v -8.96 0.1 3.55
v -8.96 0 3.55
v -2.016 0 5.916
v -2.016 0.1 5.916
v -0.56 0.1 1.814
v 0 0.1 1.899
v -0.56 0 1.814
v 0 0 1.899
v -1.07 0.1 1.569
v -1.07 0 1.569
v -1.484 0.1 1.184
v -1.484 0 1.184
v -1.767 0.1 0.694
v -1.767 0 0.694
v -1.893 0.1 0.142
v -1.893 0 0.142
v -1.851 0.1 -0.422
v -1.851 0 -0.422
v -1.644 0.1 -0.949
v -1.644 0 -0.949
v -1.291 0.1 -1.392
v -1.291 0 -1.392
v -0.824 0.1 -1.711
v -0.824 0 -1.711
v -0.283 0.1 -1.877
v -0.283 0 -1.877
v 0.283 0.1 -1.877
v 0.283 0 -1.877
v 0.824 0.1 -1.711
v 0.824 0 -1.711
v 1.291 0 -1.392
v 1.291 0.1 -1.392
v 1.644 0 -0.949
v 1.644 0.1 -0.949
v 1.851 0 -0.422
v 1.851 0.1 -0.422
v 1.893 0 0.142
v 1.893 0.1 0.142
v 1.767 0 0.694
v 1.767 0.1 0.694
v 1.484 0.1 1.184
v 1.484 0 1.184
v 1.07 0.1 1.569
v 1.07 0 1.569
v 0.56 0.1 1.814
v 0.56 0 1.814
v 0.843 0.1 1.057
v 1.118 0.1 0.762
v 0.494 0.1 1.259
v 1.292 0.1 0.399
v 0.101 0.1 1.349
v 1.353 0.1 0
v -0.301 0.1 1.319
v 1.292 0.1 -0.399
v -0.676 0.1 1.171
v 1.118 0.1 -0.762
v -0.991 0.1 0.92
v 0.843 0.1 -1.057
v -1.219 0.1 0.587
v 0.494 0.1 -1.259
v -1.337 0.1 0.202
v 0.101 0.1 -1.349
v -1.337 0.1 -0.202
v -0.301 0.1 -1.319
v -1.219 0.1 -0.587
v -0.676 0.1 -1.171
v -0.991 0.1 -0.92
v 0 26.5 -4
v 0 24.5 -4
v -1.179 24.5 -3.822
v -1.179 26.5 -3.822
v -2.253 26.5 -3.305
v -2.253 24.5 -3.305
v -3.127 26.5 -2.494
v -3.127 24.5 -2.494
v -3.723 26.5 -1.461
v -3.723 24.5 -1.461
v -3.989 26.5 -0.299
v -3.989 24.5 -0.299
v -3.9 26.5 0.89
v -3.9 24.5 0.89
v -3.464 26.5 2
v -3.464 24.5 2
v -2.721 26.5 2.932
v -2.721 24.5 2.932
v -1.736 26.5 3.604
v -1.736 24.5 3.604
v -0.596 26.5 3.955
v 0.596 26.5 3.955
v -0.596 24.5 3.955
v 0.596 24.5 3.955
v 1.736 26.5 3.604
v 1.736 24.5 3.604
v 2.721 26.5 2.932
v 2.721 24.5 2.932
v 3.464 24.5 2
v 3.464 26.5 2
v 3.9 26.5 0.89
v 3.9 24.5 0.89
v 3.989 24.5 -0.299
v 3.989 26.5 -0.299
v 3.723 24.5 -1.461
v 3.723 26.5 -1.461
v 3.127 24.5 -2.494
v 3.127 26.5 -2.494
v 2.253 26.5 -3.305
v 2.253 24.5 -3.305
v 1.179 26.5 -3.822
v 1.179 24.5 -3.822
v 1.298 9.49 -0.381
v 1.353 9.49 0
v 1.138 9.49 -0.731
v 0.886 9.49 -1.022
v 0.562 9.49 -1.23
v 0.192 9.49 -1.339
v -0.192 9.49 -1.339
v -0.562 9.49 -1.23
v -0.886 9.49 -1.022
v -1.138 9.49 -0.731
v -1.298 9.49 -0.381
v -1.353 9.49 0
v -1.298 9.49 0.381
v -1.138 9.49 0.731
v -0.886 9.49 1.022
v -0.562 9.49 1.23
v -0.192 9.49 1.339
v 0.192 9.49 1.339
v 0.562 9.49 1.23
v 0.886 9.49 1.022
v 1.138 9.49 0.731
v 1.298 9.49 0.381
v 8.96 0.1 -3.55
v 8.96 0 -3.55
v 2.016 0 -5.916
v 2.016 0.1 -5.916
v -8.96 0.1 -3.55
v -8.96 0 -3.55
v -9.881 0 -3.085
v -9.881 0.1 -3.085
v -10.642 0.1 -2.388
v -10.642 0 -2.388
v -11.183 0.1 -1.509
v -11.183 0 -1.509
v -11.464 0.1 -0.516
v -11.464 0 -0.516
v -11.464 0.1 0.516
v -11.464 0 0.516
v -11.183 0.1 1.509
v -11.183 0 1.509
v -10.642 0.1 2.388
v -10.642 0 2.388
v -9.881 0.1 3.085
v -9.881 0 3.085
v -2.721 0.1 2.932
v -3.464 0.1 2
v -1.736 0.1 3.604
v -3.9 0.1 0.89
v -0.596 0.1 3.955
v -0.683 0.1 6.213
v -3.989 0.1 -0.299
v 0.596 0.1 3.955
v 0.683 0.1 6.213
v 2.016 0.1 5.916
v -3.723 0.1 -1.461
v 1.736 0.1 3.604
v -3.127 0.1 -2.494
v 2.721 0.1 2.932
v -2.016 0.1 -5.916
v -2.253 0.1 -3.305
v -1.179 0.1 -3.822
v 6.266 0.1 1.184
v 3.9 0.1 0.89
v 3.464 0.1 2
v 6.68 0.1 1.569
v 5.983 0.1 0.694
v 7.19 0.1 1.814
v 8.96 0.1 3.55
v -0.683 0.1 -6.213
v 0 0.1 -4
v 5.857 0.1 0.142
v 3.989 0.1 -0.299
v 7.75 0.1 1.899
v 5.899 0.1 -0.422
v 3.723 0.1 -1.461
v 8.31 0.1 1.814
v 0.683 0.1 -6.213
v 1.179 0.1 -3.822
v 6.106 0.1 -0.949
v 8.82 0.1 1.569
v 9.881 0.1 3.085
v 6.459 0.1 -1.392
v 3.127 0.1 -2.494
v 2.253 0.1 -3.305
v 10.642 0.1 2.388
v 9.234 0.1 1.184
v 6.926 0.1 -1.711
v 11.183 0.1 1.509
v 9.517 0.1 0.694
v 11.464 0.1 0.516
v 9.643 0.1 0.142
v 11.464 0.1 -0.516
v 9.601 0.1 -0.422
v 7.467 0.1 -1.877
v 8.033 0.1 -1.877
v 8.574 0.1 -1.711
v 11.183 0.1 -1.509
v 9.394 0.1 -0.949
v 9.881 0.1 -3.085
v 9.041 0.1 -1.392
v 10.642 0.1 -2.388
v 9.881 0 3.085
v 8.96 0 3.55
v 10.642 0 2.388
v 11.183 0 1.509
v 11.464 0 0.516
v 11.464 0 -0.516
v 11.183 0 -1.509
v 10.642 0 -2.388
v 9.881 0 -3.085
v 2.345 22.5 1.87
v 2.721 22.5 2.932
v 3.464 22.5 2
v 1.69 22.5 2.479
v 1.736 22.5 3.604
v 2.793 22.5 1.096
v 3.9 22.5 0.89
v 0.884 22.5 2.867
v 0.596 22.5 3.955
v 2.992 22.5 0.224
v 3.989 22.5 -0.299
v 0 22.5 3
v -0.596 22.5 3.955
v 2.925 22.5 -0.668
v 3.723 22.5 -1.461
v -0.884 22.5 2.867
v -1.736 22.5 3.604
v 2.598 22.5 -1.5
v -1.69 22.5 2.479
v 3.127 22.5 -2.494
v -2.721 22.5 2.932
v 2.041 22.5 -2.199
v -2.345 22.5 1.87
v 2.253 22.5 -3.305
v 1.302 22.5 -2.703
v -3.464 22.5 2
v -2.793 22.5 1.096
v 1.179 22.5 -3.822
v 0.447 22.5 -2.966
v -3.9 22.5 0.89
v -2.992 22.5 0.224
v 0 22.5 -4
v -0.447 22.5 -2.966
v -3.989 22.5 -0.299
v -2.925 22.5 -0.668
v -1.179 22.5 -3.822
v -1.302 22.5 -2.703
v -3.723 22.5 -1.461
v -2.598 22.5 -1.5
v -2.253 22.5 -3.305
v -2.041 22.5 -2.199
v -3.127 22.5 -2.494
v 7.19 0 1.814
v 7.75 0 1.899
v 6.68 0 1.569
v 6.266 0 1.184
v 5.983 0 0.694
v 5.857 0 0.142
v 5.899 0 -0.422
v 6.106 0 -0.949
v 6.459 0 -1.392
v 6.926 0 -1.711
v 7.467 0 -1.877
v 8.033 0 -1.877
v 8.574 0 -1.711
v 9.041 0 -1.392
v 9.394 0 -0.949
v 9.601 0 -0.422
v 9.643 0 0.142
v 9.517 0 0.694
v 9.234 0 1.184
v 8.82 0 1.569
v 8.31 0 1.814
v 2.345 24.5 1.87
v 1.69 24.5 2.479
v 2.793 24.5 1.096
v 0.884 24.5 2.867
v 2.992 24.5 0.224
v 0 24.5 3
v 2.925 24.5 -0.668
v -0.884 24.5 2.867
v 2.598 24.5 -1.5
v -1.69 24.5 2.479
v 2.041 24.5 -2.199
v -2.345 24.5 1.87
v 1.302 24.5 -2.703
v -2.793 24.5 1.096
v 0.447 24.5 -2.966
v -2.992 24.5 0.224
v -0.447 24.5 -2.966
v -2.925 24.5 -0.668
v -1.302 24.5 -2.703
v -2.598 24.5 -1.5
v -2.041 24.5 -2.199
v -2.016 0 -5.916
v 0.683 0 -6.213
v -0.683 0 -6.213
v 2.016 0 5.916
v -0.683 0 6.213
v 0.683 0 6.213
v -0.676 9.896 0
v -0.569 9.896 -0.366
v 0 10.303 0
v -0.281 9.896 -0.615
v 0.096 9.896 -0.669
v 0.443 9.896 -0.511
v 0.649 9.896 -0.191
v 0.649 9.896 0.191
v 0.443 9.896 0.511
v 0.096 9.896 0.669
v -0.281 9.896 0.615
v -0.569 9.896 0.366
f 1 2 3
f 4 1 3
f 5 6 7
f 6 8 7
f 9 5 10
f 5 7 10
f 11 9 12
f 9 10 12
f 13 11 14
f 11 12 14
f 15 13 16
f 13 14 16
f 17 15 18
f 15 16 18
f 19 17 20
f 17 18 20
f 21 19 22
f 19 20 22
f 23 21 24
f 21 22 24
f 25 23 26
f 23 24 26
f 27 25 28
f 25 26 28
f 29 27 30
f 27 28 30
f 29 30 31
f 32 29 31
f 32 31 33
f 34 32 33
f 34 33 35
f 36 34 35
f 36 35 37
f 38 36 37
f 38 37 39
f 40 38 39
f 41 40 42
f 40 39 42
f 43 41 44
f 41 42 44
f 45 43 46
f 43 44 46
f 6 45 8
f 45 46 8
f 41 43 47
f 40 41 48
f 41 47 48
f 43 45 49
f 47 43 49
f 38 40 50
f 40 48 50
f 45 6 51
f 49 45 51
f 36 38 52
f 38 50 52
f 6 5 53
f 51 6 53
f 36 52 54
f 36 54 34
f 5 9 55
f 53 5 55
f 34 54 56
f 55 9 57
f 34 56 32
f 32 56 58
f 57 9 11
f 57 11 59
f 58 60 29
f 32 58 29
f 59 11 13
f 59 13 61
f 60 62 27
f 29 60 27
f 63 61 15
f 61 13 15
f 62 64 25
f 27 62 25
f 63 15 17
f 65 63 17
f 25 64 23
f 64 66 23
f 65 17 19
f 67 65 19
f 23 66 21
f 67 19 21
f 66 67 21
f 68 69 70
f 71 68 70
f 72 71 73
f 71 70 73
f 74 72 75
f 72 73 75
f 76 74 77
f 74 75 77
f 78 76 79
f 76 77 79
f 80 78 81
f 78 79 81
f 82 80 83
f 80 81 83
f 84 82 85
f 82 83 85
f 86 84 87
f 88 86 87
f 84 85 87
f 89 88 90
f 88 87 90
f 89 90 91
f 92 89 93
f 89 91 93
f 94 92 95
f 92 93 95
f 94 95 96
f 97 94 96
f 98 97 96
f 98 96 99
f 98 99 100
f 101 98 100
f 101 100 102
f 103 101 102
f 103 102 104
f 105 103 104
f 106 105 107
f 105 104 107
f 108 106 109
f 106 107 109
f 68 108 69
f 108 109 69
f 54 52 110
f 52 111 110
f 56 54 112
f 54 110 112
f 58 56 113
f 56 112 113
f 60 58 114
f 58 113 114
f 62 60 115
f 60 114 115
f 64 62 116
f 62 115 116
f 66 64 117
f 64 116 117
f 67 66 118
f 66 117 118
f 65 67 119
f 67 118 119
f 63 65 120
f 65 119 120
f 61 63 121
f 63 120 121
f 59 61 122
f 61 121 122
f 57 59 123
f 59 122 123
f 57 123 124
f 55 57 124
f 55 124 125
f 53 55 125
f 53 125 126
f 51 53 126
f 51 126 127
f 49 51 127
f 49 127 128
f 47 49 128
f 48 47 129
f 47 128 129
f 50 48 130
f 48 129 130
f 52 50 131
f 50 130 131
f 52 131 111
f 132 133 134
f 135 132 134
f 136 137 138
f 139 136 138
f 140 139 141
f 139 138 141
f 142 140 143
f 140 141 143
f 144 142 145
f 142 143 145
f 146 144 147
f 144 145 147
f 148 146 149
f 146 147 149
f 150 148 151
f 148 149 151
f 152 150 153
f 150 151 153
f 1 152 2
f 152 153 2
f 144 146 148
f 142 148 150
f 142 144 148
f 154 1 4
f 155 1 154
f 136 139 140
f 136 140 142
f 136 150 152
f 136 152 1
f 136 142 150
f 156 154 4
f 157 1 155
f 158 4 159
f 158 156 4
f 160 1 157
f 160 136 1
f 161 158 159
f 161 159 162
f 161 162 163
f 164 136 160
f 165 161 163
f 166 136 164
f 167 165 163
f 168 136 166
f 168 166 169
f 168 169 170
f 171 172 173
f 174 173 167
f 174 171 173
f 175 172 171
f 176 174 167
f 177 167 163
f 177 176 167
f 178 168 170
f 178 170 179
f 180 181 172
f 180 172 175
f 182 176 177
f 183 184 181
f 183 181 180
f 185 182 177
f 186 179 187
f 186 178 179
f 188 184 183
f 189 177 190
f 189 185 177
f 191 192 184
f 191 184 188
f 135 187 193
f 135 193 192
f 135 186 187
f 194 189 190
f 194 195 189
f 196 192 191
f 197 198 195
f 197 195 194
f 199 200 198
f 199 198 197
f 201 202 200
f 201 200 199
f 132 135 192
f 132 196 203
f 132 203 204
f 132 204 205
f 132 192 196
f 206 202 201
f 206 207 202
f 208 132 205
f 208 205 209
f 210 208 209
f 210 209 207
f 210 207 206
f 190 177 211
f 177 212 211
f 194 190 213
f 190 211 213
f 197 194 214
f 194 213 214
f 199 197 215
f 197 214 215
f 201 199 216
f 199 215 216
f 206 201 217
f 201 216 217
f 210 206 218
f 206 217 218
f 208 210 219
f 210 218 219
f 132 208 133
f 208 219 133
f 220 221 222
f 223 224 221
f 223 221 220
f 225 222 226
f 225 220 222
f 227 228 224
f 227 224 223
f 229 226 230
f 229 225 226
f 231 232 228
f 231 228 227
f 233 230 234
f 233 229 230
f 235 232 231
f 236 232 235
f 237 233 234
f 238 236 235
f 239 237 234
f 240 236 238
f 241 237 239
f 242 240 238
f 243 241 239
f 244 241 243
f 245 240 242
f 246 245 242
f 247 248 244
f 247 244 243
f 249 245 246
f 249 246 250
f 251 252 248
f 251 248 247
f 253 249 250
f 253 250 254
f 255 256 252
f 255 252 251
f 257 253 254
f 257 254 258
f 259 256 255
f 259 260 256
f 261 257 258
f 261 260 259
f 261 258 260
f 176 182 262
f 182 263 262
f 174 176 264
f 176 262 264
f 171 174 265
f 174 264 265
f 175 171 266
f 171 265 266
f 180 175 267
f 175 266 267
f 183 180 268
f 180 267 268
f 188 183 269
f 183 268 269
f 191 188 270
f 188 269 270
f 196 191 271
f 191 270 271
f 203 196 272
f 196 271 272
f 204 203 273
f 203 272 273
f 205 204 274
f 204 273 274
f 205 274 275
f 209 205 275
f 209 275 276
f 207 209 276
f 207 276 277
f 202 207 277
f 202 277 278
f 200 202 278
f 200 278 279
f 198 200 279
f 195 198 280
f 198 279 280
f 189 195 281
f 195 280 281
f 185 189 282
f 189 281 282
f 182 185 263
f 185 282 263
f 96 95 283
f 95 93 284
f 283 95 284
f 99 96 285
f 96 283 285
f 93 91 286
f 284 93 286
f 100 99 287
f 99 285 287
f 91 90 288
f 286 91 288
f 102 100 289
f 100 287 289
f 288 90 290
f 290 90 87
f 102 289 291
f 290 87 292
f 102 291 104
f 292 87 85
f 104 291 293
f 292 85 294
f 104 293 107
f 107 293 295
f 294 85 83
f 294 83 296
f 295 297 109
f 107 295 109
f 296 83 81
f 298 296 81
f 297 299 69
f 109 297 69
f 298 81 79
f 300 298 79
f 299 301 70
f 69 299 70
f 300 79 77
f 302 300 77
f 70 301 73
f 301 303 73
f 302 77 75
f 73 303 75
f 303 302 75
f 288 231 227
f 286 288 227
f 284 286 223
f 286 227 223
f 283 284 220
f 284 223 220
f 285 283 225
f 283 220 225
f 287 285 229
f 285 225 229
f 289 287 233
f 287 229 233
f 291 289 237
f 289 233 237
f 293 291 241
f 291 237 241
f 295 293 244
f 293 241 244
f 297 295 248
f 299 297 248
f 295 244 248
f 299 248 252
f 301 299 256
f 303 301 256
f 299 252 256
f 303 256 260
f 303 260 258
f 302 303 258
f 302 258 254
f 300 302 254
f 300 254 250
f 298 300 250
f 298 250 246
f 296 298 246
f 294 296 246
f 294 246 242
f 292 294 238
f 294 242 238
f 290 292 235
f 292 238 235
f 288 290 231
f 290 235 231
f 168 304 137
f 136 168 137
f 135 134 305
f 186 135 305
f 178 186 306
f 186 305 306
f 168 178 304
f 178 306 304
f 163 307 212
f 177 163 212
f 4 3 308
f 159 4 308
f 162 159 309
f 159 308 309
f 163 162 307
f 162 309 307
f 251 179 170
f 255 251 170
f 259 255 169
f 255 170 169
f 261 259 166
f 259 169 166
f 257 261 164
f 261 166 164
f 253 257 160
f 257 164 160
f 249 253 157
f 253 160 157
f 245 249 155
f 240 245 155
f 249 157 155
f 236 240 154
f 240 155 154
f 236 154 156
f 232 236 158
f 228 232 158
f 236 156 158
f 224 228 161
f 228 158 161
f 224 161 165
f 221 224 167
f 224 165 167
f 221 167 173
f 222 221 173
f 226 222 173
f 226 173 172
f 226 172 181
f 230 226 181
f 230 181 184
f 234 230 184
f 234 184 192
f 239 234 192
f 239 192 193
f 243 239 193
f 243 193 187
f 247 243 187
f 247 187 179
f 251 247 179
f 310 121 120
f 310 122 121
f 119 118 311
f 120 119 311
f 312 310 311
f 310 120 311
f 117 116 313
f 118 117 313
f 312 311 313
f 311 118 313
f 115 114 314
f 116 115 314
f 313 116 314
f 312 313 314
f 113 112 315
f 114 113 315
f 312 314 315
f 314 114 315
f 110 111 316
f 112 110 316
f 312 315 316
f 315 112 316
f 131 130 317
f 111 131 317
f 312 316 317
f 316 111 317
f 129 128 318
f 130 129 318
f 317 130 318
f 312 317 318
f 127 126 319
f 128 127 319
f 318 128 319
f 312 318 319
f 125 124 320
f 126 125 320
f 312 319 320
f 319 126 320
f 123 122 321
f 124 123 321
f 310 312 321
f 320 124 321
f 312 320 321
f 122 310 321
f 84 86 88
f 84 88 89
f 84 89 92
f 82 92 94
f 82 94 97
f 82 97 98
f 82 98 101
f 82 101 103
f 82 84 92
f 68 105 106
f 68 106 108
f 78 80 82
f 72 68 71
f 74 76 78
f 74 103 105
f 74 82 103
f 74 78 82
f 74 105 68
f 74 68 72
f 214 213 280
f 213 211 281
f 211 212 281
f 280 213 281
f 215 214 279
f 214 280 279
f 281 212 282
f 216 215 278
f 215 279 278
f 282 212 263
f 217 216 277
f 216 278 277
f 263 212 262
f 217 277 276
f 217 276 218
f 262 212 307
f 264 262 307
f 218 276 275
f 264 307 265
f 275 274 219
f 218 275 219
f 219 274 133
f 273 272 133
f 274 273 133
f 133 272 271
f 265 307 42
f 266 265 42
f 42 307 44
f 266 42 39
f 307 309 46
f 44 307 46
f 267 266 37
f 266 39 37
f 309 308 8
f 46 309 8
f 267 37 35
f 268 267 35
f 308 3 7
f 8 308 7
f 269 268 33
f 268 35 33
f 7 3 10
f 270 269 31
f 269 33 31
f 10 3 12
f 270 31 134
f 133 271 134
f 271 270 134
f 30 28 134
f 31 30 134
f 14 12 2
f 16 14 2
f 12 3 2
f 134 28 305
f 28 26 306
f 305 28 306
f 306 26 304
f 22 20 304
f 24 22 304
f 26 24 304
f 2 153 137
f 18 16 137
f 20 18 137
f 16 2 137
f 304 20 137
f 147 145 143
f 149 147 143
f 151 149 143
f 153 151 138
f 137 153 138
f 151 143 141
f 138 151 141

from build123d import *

# Parameters (mm, degrees)
SKETCH1_R                      = 6.25
SKETCH1_R_2                    = 3.75
SKETCH1_R_3                    = 2.5
BOSS_EXTRUDE1_DEPTH            = 0.1
SKETCH2_R                      = 4
BOSS_EXTRUDE2_DEPTH            = 22.5
SKETCH3_R                      = 3
BOSS_EXTRUDE3_DEPTH            = 2
SKETCH4_R                      = 4
BOSS_EXTRUDE4_DEPTH            = 2
SKETCH6_W                      = 1.89865
SKETCH6_H                      = 0.1
F_6_CLEARANCE_HOLE1_AT_2_COUNT = 2
F_6_CLEARANCE_HOLE1_AT_2_PITCH = 7.75
F_6_32_TAPPED_HOLE2_D          = 2.7051
F_6_32_TAPPED_HOLE2_DEPTH      = 9.39
F_6_32_TAPPED_HOLE2_TIP        = 0.81269403


with BuildPart() as part:
    # Sketch1 → Boss-Extrude1 (new body)
    # profile 1 of 15: a face of its own
    with BuildSketch(Plane(origin=(0, 0, 0), x_dir=(1, 0, 0), z_dir=(0, 1, 0))):
        Circle(SKETCH1_R)
    # profile 2 of 15: a face of its own
    with BuildSketch(Plane(origin=(0, 0, 0), x_dir=(1, 0, 0), z_dir=(0, 1, 0))):
        with Locations((-7.75, 0)):
            Circle(SKETCH1_R_2)
        with Locations((-7.75, 0)):
            Circle(SKETCH1_R_3, mode=Mode.SUBTRACT)
    # profile 3 of 15: a face of its own
    with BuildSketch(Plane(origin=(0, 0, 0), x_dir=(1, 0, 0), z_dir=(0, 1, 0))):
        Circle(SKETCH1_R)
    # profile 4 of 15: a face of its own
    with BuildSketch(Plane(origin=(0, 0, 0), x_dir=(1, 0, 0), z_dir=(0, 1, 0))):
        with Locations((-7.75, 0)):
            Circle(SKETCH1_R_2)
        with Locations((-7.75, 0)):
            Circle(SKETCH1_R_3, mode=Mode.SUBTRACT)
    # profile 5 of 15: a face of its own
    with BuildSketch(Plane(origin=(0, 0, 0), x_dir=(1, 0, 0), z_dir=(0, 1, 0))):
        with Locations((7.75, 0)):
            Circle(SKETCH1_R_2)
    # profile 6 of 15: a face of its own
    with BuildSketch(Plane(origin=(0, 0, 0), x_dir=(1, 0, 0), z_dir=(0, 1, 0))):
        Circle(SKETCH1_R)
    # profile 7 of 15: a face of its own
    with BuildSketch(Plane(origin=(0, 0, 0), x_dir=(1, 0, 0), z_dir=(0, 1, 0))):
        with Locations((-7.75, 0)):
            Circle(SKETCH1_R_2)
    # profile 8 of 15: a face of its own
    with BuildSketch(Plane(origin=(0, 0, 0), x_dir=(1, 0, 0), z_dir=(0, 1, 0))):
        with BuildLine():
            ThreePointArc((-5.487903226, -2.990889196), (-7.15425073, -3.702375293), (-8.959677419, -3.54953244))
            Line((-8.959677419, -3.54953244), (-2.016129032, -5.9158874))
            ThreePointArc((-2.016129032, -5.9158874), (-4.026975125, -4.77974595), (-5.487903226, -2.990889196))
        make_face()
    # profile 9 of 15: a face of its own
    with BuildSketch(Plane(origin=(0, 0, 0), x_dir=(1, 0, 0), z_dir=(0, 1, 0))):
        with BuildLine():
            ThreePointArc((5.487903226, -2.990889196), (4.026975125, -4.77974595), (2.016129032, -5.9158874))
            Line((2.016129032, -5.9158874), (8.959677419, -3.54953244))
            ThreePointArc((8.959677419, -3.54953244), (7.15425073, -3.702375293), (5.487903226, -2.990889196))
        make_face()
    # profile 10 of 15: a face of its own
    with BuildSketch(Plane(origin=(0, 0, 0), x_dir=(1, 0, 0), z_dir=(0, 1, 0))):
        Circle(SKETCH1_R)
    # profile 11 of 15: a face of its own
    with BuildSketch(Plane(origin=(0, 0, 0), x_dir=(1, 0, 0), z_dir=(0, 1, 0))):
        with Locations((7.75, 0)):
            Circle(SKETCH1_R_2)
        with Locations((7.75, 0)):
            Circle(SKETCH1_R_3, mode=Mode.SUBTRACT)
    # profile 12 of 15: a face of its own
    with BuildSketch(Plane(origin=(0, 0, 0), x_dir=(1, 0, 0), z_dir=(0, 1, 0))):
        with Locations((7.75, 0)):
            Circle(SKETCH1_R_2)
        with Locations((7.75, 0)):
            Circle(SKETCH1_R_3, mode=Mode.SUBTRACT)
    # profile 13 of 15: a face of its own
    with BuildSketch(Plane(origin=(0, 0, 0), x_dir=(1, 0, 0), z_dir=(0, 1, 0))):
        Circle(SKETCH1_R)
    # profile 14 of 15: a face of its own
    with BuildSketch(Plane(origin=(0, 0, 0), x_dir=(1, 0, 0), z_dir=(0, 1, 0))):
        with BuildLine():
            Line((8.959677419, 3.54953244), (2.016129032, 5.9158874))
            ThreePointArc((2.016129032, 5.9158874), (4.026975125, 4.77974595), (5.487903226, 2.990889196))
            ThreePointArc((5.487903226, 2.990889196), (7.15425073, 3.702375293), (8.959677419, 3.54953244))
        make_face()
    # profile 15 of 15: a face of its own
    with BuildSketch(Plane(origin=(0, 0, 0), x_dir=(1, 0, 0), z_dir=(0, 1, 0))):
        with BuildLine():
            Line((-2.016129032, 5.9158874), (-8.959677419, 3.54953244))
            ThreePointArc((-8.959677419, 3.54953244), (-7.15425073, 3.702375293), (-5.487903226, 2.990889196))
            ThreePointArc((-5.487903226, 2.990889196), (-4.026975125, 4.77974595), (-2.016129032, 5.9158874))
        make_face()
    extrude(amount=BOSS_EXTRUDE1_DEPTH)

    # Sketch2 → Boss-Extrude2 (add)
    with BuildSketch(Plane(origin=(0, 0, 0), x_dir=(1, 0, 0), z_dir=(0, 1, 0))):
        with Locations(Location((0, 0, 0), (0, 0, 90))):
            Circle(SKETCH2_R)
    extrude(amount=BOSS_EXTRUDE2_DEPTH)

    # Sketch3 → Boss-Extrude3 (add)
    with BuildSketch(Plane(origin=(0, 22.5, 0), x_dir=(1, 0, 0), z_dir=(0, 1, 0))):
        with Locations(Location((0, 0, 0), (0, 0, 270))):
            Circle(SKETCH3_R)
    extrude(amount=BOSS_EXTRUDE3_DEPTH)

    # Sketch4 → Boss-Extrude4 (add)
    with BuildSketch(Plane(origin=(0, 24.5, 0), x_dir=(1, 0, 0), z_dir=(0, 1, 0))):
        with Locations(Location((0, 0, 0), (0, 0, 90))):
            Circle(SKETCH4_R)
    extrude(amount=BOSS_EXTRUDE4_DEPTH)

    # Sketch6 → #6 Clearance Hole1 (revolve, cut)
    with BuildSketch(Plane(origin=(7.75, 0.1, 0), x_dir=(0, 0, 1), z_dir=(1, 0, 0))):
        with Locations((0.949325, 0.05)):
            Rectangle(SKETCH6_W, SKETCH6_H)
    f_6_clearance_hole1 = revolve(axis=Axis((7.75, 6.45, 0), (0, -1, 0)), mode=Mode.SUBTRACT)

    # #6 Clearance Hole1 at 2: #6 Clearance Hole1 ×2
    with Locations(*[(-i * F_6_CLEARANCE_HOLE1_AT_2_PITCH, 0, 0) for i in range(1, F_6_CLEARANCE_HOLE1_AT_2_COUNT)]):
        add(f_6_clearance_hole1, mode=Mode.SUBTRACT)

    # #6-32 Tapped Hole2
    with Locations(Plane(origin=(0, 0.1, 0), x_dir=(-1, 0, 0), z_dir=(0, -1, 0))):
        with Locations((0, 0)):
            Hole(F_6_32_TAPPED_HOLE2_D / 2, depth=F_6_32_TAPPED_HOLE2_DEPTH)
            with Locations((0, 0, -(F_6_32_TAPPED_HOLE2_DEPTH + F_6_32_TAPPED_HOLE2_TIP / 2))):  # 118° drill point
                Cone(0, F_6_32_TAPPED_HOLE2_D / 2, F_6_32_TAPPED_HOLE2_TIP, mode=Mode.SUBTRACT)


solid = part.part
